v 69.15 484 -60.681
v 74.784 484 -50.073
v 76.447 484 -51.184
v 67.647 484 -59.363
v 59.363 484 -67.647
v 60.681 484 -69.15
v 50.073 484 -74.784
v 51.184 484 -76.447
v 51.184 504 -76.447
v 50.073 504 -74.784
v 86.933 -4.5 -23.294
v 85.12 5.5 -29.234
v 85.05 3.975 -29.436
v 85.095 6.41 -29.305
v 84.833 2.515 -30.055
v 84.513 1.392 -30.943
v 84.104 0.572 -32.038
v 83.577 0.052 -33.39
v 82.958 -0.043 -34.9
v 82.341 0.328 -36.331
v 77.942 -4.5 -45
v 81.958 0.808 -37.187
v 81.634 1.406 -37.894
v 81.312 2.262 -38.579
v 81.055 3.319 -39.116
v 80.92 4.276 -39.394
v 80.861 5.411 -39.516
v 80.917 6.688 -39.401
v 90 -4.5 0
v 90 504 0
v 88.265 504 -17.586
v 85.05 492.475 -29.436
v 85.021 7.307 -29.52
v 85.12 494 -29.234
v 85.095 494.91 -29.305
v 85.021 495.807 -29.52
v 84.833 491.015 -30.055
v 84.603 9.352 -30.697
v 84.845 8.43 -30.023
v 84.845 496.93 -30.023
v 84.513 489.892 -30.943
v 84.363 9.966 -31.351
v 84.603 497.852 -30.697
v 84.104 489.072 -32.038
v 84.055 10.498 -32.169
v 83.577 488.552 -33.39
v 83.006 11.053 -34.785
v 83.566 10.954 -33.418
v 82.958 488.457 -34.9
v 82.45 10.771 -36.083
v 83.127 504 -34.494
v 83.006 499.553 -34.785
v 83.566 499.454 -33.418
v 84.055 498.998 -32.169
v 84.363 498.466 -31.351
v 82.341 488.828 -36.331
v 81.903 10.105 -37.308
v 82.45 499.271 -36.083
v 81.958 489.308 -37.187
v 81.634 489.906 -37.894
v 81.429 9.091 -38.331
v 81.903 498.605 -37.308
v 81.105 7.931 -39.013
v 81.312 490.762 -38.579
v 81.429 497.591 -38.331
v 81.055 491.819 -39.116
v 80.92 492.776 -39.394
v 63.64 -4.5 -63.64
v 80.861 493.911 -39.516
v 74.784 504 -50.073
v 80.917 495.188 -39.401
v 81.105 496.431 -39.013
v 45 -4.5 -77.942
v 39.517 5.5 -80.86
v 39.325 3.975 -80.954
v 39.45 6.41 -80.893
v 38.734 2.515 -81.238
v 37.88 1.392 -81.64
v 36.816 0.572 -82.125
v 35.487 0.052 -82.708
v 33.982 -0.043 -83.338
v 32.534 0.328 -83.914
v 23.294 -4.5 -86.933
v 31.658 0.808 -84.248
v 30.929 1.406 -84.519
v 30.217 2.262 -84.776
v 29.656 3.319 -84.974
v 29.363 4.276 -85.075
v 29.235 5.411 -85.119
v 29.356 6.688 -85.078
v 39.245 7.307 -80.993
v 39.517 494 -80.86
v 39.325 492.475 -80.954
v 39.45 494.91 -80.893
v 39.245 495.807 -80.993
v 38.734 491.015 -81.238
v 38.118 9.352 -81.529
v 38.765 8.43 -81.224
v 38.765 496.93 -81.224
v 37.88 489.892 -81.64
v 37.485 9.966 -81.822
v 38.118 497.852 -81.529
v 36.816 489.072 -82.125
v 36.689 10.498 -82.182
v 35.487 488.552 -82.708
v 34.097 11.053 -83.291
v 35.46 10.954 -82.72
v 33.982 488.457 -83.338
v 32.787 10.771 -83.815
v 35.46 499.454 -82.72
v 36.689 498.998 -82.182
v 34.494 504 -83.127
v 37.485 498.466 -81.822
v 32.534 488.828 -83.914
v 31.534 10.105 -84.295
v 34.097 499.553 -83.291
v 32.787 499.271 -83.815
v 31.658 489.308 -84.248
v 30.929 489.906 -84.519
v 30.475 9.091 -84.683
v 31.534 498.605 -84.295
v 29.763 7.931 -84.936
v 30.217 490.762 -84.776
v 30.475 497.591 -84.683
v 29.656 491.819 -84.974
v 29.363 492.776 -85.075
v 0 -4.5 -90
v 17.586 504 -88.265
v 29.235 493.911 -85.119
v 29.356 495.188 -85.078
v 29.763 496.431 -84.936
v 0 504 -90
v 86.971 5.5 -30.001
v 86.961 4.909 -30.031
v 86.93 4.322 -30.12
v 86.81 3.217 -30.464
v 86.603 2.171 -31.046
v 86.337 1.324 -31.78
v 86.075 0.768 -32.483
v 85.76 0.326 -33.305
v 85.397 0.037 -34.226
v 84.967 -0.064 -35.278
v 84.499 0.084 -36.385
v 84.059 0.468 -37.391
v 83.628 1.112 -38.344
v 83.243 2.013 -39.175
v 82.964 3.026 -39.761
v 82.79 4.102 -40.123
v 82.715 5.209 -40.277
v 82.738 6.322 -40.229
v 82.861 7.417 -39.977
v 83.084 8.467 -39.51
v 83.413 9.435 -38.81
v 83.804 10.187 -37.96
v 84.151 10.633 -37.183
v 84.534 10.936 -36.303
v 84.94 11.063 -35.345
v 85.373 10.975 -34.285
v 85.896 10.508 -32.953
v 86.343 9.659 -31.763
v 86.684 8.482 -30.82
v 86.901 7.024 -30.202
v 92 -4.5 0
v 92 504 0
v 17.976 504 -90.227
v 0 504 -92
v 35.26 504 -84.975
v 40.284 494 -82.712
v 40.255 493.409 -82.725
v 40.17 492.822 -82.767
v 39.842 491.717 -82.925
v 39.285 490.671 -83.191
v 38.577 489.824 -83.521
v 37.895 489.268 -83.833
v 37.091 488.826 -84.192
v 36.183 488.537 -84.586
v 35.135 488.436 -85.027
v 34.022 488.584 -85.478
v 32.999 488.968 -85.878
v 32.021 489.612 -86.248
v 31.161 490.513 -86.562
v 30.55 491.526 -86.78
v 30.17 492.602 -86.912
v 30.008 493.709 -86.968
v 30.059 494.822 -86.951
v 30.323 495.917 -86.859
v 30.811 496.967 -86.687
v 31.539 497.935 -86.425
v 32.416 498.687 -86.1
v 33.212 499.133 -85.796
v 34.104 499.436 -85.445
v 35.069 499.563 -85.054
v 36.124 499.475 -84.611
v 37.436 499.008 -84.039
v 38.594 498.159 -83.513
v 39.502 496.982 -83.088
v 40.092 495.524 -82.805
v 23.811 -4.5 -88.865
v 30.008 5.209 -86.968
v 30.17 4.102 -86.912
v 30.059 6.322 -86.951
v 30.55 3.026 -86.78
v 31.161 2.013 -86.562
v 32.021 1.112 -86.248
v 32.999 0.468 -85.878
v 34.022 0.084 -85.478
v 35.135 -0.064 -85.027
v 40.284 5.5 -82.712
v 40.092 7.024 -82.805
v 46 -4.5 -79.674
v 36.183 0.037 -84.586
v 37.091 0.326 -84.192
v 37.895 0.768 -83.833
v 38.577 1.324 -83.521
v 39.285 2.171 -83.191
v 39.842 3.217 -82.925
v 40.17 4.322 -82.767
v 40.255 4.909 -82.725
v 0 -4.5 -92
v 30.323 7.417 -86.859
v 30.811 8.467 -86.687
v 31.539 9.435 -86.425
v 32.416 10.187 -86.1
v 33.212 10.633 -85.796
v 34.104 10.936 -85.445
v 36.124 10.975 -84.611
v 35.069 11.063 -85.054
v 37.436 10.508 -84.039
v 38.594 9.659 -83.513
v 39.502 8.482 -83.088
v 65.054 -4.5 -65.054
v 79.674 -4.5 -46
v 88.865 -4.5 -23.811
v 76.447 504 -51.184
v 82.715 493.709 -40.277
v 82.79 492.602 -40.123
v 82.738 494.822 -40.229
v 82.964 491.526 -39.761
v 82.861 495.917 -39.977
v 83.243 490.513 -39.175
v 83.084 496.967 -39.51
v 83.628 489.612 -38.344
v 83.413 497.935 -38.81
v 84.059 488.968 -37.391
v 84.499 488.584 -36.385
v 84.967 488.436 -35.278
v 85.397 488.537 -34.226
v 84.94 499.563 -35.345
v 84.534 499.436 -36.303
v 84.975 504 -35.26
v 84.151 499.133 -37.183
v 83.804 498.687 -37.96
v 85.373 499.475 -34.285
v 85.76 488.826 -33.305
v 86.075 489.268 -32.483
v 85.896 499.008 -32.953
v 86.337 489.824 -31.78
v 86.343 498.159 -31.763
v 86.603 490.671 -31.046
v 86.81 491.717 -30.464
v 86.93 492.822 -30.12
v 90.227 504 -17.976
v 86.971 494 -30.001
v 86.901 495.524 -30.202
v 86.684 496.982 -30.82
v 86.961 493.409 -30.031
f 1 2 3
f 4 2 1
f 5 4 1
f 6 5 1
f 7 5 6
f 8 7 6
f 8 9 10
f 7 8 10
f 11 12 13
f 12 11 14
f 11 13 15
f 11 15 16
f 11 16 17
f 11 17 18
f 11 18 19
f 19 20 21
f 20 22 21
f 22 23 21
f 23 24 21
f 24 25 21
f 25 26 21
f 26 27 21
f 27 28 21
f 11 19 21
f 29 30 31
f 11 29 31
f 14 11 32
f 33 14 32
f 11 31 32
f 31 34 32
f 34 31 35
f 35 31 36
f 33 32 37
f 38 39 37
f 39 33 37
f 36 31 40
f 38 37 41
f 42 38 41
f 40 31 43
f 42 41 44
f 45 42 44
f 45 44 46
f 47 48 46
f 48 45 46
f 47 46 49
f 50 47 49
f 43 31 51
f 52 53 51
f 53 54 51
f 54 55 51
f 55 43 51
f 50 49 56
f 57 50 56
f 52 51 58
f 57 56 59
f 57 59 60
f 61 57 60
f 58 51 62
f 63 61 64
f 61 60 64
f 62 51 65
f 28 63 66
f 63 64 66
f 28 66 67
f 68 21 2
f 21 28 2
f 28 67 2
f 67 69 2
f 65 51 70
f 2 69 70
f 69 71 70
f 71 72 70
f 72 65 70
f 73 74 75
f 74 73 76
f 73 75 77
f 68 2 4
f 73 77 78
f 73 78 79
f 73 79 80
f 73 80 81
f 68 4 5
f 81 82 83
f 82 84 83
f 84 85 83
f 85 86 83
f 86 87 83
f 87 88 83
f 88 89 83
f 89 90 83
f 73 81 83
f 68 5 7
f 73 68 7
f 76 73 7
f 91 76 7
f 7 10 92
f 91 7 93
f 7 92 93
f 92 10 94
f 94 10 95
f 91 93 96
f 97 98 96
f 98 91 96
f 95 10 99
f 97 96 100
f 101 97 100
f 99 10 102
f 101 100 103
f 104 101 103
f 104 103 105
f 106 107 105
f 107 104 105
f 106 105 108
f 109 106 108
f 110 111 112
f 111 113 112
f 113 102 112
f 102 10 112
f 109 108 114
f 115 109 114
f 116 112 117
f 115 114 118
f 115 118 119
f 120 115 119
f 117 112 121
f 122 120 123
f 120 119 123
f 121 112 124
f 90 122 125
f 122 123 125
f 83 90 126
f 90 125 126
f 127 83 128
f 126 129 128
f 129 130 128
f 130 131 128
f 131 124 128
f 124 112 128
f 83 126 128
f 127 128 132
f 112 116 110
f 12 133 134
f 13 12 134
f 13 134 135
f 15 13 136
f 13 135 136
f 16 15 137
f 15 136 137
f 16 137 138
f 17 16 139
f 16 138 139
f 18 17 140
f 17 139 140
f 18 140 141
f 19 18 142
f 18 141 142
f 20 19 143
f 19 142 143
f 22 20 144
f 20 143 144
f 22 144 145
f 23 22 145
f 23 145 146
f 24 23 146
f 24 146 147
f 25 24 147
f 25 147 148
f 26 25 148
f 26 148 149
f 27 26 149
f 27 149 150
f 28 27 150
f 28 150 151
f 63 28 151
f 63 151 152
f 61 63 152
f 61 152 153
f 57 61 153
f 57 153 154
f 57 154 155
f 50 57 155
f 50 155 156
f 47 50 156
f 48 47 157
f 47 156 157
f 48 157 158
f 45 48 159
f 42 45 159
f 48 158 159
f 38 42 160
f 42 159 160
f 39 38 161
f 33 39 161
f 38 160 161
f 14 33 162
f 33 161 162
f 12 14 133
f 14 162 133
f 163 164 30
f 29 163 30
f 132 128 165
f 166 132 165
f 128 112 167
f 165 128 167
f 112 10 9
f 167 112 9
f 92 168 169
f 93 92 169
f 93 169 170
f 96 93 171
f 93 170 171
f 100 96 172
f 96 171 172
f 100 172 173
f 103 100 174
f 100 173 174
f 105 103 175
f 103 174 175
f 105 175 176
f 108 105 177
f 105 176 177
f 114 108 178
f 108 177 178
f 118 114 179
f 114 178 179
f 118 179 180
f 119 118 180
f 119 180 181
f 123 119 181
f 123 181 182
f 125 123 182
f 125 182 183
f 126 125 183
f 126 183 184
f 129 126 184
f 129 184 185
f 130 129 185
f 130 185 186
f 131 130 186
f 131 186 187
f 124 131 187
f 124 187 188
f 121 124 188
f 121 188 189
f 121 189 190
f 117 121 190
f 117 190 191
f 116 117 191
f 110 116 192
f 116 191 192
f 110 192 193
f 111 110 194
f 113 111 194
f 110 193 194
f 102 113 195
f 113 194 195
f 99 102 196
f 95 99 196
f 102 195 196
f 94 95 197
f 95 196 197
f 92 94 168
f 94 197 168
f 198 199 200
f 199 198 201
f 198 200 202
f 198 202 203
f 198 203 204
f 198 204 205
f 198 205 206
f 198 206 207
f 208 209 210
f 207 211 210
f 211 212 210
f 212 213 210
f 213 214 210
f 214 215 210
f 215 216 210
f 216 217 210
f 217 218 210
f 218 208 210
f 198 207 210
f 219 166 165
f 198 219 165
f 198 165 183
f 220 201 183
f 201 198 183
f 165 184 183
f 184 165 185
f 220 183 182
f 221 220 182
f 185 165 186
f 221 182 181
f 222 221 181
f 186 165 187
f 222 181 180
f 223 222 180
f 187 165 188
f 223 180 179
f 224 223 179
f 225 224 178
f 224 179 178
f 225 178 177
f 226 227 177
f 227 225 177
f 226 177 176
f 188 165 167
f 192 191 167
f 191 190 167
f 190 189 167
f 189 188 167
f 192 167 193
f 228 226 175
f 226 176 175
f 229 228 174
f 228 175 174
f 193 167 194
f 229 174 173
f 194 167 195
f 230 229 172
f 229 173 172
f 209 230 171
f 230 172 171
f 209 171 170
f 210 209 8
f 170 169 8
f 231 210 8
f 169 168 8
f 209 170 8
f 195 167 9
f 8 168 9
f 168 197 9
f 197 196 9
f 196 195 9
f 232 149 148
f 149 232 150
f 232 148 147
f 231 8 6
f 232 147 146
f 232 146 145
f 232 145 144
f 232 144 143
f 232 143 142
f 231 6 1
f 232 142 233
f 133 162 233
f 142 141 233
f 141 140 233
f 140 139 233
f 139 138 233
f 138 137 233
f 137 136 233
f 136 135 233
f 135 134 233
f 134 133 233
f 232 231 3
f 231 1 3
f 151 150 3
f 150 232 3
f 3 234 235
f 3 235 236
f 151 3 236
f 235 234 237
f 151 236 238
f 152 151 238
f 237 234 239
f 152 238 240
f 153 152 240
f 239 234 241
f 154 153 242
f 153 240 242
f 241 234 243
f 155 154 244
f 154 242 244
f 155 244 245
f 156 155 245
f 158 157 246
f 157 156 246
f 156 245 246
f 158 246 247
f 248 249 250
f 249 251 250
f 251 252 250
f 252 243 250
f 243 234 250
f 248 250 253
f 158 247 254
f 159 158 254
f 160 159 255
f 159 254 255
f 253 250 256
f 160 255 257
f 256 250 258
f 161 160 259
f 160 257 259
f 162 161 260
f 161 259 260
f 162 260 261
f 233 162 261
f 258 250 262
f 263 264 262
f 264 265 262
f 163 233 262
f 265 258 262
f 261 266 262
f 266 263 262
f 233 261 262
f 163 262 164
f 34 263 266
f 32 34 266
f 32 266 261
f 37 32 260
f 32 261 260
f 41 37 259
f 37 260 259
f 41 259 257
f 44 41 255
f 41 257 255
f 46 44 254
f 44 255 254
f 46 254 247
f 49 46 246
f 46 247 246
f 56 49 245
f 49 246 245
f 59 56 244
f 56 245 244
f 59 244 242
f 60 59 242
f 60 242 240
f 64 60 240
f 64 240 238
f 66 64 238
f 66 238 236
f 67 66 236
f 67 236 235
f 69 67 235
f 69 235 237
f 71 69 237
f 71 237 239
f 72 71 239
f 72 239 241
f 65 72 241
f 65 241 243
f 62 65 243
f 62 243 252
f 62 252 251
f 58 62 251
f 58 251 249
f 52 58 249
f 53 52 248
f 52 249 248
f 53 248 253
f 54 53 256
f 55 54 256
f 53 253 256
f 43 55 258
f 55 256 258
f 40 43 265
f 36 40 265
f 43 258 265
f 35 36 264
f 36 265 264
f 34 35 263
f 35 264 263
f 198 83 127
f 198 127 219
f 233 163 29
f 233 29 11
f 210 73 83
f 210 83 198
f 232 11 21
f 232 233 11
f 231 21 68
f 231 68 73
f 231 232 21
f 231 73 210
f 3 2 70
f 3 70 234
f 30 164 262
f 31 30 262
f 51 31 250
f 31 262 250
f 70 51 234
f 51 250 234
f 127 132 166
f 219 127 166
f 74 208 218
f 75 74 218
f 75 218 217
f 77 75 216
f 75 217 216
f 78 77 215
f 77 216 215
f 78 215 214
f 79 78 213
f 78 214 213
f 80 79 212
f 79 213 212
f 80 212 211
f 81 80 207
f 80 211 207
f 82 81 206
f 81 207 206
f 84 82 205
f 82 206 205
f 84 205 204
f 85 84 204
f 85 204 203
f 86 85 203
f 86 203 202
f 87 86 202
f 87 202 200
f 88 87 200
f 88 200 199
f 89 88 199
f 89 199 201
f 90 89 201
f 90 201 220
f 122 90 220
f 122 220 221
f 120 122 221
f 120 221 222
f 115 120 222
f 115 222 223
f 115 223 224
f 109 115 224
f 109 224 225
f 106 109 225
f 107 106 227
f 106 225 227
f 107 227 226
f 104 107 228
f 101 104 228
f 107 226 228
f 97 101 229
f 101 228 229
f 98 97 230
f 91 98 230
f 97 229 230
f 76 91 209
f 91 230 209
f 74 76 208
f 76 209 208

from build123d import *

# Parameters (mm, degrees)
BOSS_EXTRUDE1_DEPTH     = 508.5
CUT_EXTRUDE4_REACH      = 518.756
CUT_EXTRUDE4_END_RADIUS = 90
SKETCH6_R               = 5.565
CUT_EXTRUDE2_REACH      = 520.673
CUT_EXTRUDE2_END_RADIUS = 90
SKETCH3_R               = 5.565
CUT_EXTRUDE3_REACH      = 520.673
CUT_EXTRUDE3_END_RADIUS = 90
SKETCH5_R               = 5.565
LPATTERN2_COUNT         = 2
LPATTERN2_PITCH         = 488.5
CUT_EXTRUDE5_DEPTH      = 20
BODY_MOVE_COPY1_ANGLE   = 180


with BuildPart() as part:
    # Sketch1 → Boss-Extrude1 (new body)
    with BuildSketch(Plane(origin=(0, 0, 0), x_dir=(1, 0, 0), z_dir=(0, 1, 0))):
        with BuildLine():
            Line((0, 92), (0, 90))
            ThreePointArc((0, 90), (63.639610307, 63.639610307), (90, 0))
            Line((90, 0), (92, 0))
            ThreePointArc((92, 0), (65.053823869, 65.053823869), (0, 92))
        make_face()
    extrude(amount=BOSS_EXTRUDE1_DEPTH)

    # Cut-Extrude4: up to this cylinder (the profile starts outside it)
    cut_extrude4_end = Plane(origin=(0, 10, 0), z_dir=(0, -1, 0)) * Cylinder(CUT_EXTRUDE4_END_RADIUS, 1218.512, mode=Mode.PRIVATE)
    # Sketch6 → Cut-Extrude4 (cut, up to the surface)
    with BuildSketch(Plane(origin=(65.053823869, 0, -65.053823869), x_dir=(-0.7071067811865486, 0, -0.7071067811865465), z_dir=(0.7071067811865465, 0, -0.7071067811865486)), mode=Mode.PRIVATE) as cut_extrude4_sk1:
        with Locations((0, 10)):
            Circle(SKETCH6_R)
    cut_extrude4_tool1 = extrude(cut_extrude4_sk1.sketch, amount=-CUT_EXTRUDE4_REACH, mode=Mode.PRIVATE) - cut_extrude4_end
    add(cut_extrude4_tool1.solids().sort_by_distance((65.053824, 10, -65.053824))[0], mode=Mode.SUBTRACT)

    # Cut-Extrude2: up to this cylinder (the profile starts outside it)
    cut_extrude2_end = Plane(origin=(0, 10, 0), z_dir=(0, -1, 0)) * Cylinder(CUT_EXTRUDE2_END_RADIUS, 1222.346, mode=Mode.PRIVATE)
    # Sketch3 → Cut-Extrude2 (cut, up to the surface)
    with BuildSketch(Plane(origin=(84.996916991, 0, -35.206875778), x_dir=(-0.38268343236509045, 0, -0.9238795325112865), z_dir=(0.9238795325112865, 0, -0.38268343236509045)), mode=Mode.PRIVATE) as cut_extrude2_sk1:
        with Locations((0, 10)):
            Circle(SKETCH3_R)
    cut_extrude2_tool1 = extrude(cut_extrude2_sk1.sketch, amount=-CUT_EXTRUDE2_REACH, mode=Mode.PRIVATE) - cut_extrude2_end
    cut_extrude2 = cut_extrude2_tool1.solids().sort_by_distance((84.996917, 10, -35.206876))[0]
    add(cut_extrude2, mode=Mode.SUBTRACT)

    # Cut-Extrude3: up to this cylinder (the profile starts outside it)
    cut_extrude3_end = Plane(origin=(0, 10, 0), z_dir=(0, -1, 0)) * Cylinder(CUT_EXTRUDE3_END_RADIUS, 1222.346, mode=Mode.PRIVATE)
    # Sketch5 → Cut-Extrude3 (cut, up to the surface)
    with BuildSketch(Plane(origin=(35.206875778, 0, -84.996916991), x_dir=(-0.9238795325112878, 0, -0.3826834323650876), z_dir=(0.3826834323650876, 0, -0.9238795325112878)), mode=Mode.PRIVATE) as cut_extrude3_sk1:
        with Locations((0, 10)):
            Circle(SKETCH5_R)
    cut_extrude3_tool1 = extrude(cut_extrude3_sk1.sketch, amount=-CUT_EXTRUDE3_REACH, mode=Mode.PRIVATE) - cut_extrude3_end
    cut_extrude3 = cut_extrude3_tool1.solids().sort_by_distance((35.206876, 10, -84.996917))[0]
    add(cut_extrude3, mode=Mode.SUBTRACT)

    # LPattern2: Cut-Extrude2, Cut-Extrude3 ×2
    with Locations(*[(0, i * LPATTERN2_PITCH, 0) for i in range(1, LPATTERN2_COUNT)]):
        add(cut_extrude2, mode=Mode.SUBTRACT)
        add(cut_extrude3, mode=Mode.SUBTRACT)

    # Sketch7 → Cut-Extrude5 (cut)
    with BuildSketch(Plane.XZ):
        with BuildLine():
            Line((76.447375943, -51.183969281), (74.784435976, -50.072828318))
            ThreePointArc((74.784435976, -50.072828318), (63.639610307, -63.639610307), (50.072828318, -74.784435976))
            Line((50.072828318, -74.784435976), (51.183969281, -76.447375943))
            ThreePointArc((51.183969281, -76.447375943), (65.053823869, -65.053823869), (76.447375943, -51.183969281))
        make_face()
    extrude(amount=-CUT_EXTRUDE5_DEPTH, mode=Mode.SUBTRACT)


with BuildPart() as part_1:
    # Body-Move/Copy1: moved
    add(part.part.moved(Location((0, 0, 0))).rotate(Axis((0, 252, 0), (0.7071067811865488, -4.937700262164522e-15, -0.7071067811865462)), BODY_MOVE_COPY1_ANGLE))


solid = part_1.part
